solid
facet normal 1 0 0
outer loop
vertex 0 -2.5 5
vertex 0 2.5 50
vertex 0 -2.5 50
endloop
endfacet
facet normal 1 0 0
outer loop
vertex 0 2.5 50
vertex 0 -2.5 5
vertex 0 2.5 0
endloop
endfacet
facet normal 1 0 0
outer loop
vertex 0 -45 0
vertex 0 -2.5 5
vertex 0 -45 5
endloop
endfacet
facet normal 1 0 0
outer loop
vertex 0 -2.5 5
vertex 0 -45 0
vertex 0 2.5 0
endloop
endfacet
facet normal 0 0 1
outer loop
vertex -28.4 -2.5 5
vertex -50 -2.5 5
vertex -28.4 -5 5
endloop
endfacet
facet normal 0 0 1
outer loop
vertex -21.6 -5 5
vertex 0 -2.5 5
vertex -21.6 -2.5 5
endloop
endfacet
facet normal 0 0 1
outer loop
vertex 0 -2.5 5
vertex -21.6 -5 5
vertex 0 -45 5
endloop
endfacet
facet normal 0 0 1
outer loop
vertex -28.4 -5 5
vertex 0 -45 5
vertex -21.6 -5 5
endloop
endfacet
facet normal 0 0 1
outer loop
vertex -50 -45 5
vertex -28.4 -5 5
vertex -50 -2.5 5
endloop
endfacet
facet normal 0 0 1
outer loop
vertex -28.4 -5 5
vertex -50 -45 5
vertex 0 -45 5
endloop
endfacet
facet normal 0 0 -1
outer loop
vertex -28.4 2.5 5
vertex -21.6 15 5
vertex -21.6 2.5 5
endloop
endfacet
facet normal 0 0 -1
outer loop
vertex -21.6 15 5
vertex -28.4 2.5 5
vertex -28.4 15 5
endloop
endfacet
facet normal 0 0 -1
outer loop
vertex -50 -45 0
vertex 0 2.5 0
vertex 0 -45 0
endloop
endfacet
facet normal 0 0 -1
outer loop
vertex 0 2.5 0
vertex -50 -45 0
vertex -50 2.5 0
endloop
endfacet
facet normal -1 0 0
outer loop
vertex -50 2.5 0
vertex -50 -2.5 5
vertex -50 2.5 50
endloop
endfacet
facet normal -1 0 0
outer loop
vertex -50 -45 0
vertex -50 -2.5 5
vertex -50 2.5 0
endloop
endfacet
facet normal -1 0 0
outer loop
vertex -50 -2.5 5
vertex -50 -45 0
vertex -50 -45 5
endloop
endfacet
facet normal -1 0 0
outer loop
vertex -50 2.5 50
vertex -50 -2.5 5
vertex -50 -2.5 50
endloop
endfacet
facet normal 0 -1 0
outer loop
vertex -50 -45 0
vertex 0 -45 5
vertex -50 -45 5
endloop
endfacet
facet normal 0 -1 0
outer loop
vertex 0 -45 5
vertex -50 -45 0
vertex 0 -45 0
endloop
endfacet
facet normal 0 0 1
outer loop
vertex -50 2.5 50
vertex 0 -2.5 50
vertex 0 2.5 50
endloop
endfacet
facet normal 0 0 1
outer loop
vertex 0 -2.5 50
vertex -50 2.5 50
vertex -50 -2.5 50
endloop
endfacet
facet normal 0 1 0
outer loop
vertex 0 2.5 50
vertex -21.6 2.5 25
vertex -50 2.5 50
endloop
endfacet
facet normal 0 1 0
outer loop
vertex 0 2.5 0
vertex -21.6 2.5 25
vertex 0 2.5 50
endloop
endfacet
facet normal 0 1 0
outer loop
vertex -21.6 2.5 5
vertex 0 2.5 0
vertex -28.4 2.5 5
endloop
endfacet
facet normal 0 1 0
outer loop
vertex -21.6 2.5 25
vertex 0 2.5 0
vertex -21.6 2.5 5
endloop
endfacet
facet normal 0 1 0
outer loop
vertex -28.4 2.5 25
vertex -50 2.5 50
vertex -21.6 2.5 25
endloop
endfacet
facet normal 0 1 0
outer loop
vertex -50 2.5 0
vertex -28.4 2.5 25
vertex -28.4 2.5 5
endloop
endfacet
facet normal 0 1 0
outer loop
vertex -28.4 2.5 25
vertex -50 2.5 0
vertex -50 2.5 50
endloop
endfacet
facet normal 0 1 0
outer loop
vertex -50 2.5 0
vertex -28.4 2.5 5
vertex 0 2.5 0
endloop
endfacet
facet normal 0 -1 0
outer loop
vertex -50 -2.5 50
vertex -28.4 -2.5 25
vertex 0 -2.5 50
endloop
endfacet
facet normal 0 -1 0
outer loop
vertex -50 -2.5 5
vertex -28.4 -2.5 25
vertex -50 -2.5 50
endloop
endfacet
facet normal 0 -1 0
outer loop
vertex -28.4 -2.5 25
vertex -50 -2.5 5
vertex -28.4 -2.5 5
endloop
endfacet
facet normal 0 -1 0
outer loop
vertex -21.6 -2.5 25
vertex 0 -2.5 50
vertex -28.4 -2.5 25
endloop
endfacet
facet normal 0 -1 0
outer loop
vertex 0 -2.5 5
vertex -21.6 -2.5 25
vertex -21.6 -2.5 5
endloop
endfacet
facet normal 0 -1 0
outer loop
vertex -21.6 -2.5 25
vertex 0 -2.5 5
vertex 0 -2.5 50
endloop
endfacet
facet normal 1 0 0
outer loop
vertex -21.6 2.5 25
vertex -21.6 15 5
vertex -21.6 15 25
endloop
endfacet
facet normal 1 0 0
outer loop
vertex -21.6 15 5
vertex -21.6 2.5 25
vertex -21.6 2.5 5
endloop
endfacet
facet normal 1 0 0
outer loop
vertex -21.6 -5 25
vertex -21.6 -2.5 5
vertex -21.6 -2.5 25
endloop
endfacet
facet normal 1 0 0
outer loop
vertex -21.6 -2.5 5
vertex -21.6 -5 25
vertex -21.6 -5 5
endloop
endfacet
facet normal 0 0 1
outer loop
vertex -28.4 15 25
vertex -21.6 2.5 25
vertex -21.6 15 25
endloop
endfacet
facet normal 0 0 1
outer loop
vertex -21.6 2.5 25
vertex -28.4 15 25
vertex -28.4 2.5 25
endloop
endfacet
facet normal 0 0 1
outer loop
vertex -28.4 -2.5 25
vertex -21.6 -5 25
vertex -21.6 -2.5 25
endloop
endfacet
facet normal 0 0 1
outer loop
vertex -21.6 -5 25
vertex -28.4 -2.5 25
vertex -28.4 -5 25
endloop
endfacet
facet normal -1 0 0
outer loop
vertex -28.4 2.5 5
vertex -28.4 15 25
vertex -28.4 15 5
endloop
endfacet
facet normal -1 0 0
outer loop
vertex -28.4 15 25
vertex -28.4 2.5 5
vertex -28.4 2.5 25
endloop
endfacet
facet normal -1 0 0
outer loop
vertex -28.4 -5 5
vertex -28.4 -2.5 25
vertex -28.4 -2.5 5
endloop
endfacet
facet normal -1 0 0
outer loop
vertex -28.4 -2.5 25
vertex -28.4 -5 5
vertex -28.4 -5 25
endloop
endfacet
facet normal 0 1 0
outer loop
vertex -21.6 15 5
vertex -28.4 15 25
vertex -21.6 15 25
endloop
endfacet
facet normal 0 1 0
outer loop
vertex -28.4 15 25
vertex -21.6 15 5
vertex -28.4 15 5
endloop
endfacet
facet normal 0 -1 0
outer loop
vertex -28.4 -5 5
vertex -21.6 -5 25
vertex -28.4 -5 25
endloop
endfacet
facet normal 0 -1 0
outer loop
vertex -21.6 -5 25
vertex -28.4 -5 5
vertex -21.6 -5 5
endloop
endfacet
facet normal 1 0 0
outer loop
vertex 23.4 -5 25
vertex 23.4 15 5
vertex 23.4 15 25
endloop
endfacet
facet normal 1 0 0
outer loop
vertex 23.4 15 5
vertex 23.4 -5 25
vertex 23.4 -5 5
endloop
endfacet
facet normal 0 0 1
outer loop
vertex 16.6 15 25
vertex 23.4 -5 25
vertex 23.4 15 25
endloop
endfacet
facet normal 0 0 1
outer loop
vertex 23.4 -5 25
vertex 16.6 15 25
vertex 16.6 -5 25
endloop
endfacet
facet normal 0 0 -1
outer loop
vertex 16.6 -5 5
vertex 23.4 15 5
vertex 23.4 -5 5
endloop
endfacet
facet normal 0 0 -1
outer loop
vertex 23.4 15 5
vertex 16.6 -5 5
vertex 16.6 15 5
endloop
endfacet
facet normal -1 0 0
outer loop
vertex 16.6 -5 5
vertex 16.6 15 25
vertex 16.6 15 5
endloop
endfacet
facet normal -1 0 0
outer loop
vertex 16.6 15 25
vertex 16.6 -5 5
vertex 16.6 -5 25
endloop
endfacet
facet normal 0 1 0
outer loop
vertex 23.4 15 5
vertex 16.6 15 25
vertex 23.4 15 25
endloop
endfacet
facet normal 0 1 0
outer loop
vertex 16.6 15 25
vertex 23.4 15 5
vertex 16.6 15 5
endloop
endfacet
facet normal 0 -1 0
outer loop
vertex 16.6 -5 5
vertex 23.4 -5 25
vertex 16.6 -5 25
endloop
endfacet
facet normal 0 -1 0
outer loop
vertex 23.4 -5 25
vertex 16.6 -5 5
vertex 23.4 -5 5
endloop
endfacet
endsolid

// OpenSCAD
// Built by bench/smallmodels/features/compiler.py from a list of features.
$fn = 64;
difference() {
  union() {
    translate([-25, -22.5, 0]) translate([-25, -22.5, 0]) cube([50, 45, 5]);
    translate([-25, 0, 0]) translate([-25, -2.5, 0]) cube([50, 5, 50]);
  }
  union() {
    translate([-17, 30, 3.75]) rotate([0, 0, 0]) rotate([0, 90, 0]) cylinder(d = 4.5, h = 1200, center = true);
    translate([17, 30, 3.75]) rotate([0, 0, 0]) rotate([0, 90, 0]) cylinder(d = 4.5, h = 1200, center = true);
  }
}
difference() {
  union() {
    translate([-25, 0, 0]) translate([-25, -2.5, 0]) cube([50, 5, 50]);
  }
  union() {
    translate([0, 2.5, 44.99]) rotate([0, 0, 0]) cylinder(d = 23, h = 5.02);
  }
}
union() {
    translate([-25, 5, 5]) translate([-3.4, -10, 0]) cube([6.8, 20, 20]);
    translate([20, 5, 5]) translate([-3.4, -10, 0]) cube([6.8, 20, 20]);
  }
